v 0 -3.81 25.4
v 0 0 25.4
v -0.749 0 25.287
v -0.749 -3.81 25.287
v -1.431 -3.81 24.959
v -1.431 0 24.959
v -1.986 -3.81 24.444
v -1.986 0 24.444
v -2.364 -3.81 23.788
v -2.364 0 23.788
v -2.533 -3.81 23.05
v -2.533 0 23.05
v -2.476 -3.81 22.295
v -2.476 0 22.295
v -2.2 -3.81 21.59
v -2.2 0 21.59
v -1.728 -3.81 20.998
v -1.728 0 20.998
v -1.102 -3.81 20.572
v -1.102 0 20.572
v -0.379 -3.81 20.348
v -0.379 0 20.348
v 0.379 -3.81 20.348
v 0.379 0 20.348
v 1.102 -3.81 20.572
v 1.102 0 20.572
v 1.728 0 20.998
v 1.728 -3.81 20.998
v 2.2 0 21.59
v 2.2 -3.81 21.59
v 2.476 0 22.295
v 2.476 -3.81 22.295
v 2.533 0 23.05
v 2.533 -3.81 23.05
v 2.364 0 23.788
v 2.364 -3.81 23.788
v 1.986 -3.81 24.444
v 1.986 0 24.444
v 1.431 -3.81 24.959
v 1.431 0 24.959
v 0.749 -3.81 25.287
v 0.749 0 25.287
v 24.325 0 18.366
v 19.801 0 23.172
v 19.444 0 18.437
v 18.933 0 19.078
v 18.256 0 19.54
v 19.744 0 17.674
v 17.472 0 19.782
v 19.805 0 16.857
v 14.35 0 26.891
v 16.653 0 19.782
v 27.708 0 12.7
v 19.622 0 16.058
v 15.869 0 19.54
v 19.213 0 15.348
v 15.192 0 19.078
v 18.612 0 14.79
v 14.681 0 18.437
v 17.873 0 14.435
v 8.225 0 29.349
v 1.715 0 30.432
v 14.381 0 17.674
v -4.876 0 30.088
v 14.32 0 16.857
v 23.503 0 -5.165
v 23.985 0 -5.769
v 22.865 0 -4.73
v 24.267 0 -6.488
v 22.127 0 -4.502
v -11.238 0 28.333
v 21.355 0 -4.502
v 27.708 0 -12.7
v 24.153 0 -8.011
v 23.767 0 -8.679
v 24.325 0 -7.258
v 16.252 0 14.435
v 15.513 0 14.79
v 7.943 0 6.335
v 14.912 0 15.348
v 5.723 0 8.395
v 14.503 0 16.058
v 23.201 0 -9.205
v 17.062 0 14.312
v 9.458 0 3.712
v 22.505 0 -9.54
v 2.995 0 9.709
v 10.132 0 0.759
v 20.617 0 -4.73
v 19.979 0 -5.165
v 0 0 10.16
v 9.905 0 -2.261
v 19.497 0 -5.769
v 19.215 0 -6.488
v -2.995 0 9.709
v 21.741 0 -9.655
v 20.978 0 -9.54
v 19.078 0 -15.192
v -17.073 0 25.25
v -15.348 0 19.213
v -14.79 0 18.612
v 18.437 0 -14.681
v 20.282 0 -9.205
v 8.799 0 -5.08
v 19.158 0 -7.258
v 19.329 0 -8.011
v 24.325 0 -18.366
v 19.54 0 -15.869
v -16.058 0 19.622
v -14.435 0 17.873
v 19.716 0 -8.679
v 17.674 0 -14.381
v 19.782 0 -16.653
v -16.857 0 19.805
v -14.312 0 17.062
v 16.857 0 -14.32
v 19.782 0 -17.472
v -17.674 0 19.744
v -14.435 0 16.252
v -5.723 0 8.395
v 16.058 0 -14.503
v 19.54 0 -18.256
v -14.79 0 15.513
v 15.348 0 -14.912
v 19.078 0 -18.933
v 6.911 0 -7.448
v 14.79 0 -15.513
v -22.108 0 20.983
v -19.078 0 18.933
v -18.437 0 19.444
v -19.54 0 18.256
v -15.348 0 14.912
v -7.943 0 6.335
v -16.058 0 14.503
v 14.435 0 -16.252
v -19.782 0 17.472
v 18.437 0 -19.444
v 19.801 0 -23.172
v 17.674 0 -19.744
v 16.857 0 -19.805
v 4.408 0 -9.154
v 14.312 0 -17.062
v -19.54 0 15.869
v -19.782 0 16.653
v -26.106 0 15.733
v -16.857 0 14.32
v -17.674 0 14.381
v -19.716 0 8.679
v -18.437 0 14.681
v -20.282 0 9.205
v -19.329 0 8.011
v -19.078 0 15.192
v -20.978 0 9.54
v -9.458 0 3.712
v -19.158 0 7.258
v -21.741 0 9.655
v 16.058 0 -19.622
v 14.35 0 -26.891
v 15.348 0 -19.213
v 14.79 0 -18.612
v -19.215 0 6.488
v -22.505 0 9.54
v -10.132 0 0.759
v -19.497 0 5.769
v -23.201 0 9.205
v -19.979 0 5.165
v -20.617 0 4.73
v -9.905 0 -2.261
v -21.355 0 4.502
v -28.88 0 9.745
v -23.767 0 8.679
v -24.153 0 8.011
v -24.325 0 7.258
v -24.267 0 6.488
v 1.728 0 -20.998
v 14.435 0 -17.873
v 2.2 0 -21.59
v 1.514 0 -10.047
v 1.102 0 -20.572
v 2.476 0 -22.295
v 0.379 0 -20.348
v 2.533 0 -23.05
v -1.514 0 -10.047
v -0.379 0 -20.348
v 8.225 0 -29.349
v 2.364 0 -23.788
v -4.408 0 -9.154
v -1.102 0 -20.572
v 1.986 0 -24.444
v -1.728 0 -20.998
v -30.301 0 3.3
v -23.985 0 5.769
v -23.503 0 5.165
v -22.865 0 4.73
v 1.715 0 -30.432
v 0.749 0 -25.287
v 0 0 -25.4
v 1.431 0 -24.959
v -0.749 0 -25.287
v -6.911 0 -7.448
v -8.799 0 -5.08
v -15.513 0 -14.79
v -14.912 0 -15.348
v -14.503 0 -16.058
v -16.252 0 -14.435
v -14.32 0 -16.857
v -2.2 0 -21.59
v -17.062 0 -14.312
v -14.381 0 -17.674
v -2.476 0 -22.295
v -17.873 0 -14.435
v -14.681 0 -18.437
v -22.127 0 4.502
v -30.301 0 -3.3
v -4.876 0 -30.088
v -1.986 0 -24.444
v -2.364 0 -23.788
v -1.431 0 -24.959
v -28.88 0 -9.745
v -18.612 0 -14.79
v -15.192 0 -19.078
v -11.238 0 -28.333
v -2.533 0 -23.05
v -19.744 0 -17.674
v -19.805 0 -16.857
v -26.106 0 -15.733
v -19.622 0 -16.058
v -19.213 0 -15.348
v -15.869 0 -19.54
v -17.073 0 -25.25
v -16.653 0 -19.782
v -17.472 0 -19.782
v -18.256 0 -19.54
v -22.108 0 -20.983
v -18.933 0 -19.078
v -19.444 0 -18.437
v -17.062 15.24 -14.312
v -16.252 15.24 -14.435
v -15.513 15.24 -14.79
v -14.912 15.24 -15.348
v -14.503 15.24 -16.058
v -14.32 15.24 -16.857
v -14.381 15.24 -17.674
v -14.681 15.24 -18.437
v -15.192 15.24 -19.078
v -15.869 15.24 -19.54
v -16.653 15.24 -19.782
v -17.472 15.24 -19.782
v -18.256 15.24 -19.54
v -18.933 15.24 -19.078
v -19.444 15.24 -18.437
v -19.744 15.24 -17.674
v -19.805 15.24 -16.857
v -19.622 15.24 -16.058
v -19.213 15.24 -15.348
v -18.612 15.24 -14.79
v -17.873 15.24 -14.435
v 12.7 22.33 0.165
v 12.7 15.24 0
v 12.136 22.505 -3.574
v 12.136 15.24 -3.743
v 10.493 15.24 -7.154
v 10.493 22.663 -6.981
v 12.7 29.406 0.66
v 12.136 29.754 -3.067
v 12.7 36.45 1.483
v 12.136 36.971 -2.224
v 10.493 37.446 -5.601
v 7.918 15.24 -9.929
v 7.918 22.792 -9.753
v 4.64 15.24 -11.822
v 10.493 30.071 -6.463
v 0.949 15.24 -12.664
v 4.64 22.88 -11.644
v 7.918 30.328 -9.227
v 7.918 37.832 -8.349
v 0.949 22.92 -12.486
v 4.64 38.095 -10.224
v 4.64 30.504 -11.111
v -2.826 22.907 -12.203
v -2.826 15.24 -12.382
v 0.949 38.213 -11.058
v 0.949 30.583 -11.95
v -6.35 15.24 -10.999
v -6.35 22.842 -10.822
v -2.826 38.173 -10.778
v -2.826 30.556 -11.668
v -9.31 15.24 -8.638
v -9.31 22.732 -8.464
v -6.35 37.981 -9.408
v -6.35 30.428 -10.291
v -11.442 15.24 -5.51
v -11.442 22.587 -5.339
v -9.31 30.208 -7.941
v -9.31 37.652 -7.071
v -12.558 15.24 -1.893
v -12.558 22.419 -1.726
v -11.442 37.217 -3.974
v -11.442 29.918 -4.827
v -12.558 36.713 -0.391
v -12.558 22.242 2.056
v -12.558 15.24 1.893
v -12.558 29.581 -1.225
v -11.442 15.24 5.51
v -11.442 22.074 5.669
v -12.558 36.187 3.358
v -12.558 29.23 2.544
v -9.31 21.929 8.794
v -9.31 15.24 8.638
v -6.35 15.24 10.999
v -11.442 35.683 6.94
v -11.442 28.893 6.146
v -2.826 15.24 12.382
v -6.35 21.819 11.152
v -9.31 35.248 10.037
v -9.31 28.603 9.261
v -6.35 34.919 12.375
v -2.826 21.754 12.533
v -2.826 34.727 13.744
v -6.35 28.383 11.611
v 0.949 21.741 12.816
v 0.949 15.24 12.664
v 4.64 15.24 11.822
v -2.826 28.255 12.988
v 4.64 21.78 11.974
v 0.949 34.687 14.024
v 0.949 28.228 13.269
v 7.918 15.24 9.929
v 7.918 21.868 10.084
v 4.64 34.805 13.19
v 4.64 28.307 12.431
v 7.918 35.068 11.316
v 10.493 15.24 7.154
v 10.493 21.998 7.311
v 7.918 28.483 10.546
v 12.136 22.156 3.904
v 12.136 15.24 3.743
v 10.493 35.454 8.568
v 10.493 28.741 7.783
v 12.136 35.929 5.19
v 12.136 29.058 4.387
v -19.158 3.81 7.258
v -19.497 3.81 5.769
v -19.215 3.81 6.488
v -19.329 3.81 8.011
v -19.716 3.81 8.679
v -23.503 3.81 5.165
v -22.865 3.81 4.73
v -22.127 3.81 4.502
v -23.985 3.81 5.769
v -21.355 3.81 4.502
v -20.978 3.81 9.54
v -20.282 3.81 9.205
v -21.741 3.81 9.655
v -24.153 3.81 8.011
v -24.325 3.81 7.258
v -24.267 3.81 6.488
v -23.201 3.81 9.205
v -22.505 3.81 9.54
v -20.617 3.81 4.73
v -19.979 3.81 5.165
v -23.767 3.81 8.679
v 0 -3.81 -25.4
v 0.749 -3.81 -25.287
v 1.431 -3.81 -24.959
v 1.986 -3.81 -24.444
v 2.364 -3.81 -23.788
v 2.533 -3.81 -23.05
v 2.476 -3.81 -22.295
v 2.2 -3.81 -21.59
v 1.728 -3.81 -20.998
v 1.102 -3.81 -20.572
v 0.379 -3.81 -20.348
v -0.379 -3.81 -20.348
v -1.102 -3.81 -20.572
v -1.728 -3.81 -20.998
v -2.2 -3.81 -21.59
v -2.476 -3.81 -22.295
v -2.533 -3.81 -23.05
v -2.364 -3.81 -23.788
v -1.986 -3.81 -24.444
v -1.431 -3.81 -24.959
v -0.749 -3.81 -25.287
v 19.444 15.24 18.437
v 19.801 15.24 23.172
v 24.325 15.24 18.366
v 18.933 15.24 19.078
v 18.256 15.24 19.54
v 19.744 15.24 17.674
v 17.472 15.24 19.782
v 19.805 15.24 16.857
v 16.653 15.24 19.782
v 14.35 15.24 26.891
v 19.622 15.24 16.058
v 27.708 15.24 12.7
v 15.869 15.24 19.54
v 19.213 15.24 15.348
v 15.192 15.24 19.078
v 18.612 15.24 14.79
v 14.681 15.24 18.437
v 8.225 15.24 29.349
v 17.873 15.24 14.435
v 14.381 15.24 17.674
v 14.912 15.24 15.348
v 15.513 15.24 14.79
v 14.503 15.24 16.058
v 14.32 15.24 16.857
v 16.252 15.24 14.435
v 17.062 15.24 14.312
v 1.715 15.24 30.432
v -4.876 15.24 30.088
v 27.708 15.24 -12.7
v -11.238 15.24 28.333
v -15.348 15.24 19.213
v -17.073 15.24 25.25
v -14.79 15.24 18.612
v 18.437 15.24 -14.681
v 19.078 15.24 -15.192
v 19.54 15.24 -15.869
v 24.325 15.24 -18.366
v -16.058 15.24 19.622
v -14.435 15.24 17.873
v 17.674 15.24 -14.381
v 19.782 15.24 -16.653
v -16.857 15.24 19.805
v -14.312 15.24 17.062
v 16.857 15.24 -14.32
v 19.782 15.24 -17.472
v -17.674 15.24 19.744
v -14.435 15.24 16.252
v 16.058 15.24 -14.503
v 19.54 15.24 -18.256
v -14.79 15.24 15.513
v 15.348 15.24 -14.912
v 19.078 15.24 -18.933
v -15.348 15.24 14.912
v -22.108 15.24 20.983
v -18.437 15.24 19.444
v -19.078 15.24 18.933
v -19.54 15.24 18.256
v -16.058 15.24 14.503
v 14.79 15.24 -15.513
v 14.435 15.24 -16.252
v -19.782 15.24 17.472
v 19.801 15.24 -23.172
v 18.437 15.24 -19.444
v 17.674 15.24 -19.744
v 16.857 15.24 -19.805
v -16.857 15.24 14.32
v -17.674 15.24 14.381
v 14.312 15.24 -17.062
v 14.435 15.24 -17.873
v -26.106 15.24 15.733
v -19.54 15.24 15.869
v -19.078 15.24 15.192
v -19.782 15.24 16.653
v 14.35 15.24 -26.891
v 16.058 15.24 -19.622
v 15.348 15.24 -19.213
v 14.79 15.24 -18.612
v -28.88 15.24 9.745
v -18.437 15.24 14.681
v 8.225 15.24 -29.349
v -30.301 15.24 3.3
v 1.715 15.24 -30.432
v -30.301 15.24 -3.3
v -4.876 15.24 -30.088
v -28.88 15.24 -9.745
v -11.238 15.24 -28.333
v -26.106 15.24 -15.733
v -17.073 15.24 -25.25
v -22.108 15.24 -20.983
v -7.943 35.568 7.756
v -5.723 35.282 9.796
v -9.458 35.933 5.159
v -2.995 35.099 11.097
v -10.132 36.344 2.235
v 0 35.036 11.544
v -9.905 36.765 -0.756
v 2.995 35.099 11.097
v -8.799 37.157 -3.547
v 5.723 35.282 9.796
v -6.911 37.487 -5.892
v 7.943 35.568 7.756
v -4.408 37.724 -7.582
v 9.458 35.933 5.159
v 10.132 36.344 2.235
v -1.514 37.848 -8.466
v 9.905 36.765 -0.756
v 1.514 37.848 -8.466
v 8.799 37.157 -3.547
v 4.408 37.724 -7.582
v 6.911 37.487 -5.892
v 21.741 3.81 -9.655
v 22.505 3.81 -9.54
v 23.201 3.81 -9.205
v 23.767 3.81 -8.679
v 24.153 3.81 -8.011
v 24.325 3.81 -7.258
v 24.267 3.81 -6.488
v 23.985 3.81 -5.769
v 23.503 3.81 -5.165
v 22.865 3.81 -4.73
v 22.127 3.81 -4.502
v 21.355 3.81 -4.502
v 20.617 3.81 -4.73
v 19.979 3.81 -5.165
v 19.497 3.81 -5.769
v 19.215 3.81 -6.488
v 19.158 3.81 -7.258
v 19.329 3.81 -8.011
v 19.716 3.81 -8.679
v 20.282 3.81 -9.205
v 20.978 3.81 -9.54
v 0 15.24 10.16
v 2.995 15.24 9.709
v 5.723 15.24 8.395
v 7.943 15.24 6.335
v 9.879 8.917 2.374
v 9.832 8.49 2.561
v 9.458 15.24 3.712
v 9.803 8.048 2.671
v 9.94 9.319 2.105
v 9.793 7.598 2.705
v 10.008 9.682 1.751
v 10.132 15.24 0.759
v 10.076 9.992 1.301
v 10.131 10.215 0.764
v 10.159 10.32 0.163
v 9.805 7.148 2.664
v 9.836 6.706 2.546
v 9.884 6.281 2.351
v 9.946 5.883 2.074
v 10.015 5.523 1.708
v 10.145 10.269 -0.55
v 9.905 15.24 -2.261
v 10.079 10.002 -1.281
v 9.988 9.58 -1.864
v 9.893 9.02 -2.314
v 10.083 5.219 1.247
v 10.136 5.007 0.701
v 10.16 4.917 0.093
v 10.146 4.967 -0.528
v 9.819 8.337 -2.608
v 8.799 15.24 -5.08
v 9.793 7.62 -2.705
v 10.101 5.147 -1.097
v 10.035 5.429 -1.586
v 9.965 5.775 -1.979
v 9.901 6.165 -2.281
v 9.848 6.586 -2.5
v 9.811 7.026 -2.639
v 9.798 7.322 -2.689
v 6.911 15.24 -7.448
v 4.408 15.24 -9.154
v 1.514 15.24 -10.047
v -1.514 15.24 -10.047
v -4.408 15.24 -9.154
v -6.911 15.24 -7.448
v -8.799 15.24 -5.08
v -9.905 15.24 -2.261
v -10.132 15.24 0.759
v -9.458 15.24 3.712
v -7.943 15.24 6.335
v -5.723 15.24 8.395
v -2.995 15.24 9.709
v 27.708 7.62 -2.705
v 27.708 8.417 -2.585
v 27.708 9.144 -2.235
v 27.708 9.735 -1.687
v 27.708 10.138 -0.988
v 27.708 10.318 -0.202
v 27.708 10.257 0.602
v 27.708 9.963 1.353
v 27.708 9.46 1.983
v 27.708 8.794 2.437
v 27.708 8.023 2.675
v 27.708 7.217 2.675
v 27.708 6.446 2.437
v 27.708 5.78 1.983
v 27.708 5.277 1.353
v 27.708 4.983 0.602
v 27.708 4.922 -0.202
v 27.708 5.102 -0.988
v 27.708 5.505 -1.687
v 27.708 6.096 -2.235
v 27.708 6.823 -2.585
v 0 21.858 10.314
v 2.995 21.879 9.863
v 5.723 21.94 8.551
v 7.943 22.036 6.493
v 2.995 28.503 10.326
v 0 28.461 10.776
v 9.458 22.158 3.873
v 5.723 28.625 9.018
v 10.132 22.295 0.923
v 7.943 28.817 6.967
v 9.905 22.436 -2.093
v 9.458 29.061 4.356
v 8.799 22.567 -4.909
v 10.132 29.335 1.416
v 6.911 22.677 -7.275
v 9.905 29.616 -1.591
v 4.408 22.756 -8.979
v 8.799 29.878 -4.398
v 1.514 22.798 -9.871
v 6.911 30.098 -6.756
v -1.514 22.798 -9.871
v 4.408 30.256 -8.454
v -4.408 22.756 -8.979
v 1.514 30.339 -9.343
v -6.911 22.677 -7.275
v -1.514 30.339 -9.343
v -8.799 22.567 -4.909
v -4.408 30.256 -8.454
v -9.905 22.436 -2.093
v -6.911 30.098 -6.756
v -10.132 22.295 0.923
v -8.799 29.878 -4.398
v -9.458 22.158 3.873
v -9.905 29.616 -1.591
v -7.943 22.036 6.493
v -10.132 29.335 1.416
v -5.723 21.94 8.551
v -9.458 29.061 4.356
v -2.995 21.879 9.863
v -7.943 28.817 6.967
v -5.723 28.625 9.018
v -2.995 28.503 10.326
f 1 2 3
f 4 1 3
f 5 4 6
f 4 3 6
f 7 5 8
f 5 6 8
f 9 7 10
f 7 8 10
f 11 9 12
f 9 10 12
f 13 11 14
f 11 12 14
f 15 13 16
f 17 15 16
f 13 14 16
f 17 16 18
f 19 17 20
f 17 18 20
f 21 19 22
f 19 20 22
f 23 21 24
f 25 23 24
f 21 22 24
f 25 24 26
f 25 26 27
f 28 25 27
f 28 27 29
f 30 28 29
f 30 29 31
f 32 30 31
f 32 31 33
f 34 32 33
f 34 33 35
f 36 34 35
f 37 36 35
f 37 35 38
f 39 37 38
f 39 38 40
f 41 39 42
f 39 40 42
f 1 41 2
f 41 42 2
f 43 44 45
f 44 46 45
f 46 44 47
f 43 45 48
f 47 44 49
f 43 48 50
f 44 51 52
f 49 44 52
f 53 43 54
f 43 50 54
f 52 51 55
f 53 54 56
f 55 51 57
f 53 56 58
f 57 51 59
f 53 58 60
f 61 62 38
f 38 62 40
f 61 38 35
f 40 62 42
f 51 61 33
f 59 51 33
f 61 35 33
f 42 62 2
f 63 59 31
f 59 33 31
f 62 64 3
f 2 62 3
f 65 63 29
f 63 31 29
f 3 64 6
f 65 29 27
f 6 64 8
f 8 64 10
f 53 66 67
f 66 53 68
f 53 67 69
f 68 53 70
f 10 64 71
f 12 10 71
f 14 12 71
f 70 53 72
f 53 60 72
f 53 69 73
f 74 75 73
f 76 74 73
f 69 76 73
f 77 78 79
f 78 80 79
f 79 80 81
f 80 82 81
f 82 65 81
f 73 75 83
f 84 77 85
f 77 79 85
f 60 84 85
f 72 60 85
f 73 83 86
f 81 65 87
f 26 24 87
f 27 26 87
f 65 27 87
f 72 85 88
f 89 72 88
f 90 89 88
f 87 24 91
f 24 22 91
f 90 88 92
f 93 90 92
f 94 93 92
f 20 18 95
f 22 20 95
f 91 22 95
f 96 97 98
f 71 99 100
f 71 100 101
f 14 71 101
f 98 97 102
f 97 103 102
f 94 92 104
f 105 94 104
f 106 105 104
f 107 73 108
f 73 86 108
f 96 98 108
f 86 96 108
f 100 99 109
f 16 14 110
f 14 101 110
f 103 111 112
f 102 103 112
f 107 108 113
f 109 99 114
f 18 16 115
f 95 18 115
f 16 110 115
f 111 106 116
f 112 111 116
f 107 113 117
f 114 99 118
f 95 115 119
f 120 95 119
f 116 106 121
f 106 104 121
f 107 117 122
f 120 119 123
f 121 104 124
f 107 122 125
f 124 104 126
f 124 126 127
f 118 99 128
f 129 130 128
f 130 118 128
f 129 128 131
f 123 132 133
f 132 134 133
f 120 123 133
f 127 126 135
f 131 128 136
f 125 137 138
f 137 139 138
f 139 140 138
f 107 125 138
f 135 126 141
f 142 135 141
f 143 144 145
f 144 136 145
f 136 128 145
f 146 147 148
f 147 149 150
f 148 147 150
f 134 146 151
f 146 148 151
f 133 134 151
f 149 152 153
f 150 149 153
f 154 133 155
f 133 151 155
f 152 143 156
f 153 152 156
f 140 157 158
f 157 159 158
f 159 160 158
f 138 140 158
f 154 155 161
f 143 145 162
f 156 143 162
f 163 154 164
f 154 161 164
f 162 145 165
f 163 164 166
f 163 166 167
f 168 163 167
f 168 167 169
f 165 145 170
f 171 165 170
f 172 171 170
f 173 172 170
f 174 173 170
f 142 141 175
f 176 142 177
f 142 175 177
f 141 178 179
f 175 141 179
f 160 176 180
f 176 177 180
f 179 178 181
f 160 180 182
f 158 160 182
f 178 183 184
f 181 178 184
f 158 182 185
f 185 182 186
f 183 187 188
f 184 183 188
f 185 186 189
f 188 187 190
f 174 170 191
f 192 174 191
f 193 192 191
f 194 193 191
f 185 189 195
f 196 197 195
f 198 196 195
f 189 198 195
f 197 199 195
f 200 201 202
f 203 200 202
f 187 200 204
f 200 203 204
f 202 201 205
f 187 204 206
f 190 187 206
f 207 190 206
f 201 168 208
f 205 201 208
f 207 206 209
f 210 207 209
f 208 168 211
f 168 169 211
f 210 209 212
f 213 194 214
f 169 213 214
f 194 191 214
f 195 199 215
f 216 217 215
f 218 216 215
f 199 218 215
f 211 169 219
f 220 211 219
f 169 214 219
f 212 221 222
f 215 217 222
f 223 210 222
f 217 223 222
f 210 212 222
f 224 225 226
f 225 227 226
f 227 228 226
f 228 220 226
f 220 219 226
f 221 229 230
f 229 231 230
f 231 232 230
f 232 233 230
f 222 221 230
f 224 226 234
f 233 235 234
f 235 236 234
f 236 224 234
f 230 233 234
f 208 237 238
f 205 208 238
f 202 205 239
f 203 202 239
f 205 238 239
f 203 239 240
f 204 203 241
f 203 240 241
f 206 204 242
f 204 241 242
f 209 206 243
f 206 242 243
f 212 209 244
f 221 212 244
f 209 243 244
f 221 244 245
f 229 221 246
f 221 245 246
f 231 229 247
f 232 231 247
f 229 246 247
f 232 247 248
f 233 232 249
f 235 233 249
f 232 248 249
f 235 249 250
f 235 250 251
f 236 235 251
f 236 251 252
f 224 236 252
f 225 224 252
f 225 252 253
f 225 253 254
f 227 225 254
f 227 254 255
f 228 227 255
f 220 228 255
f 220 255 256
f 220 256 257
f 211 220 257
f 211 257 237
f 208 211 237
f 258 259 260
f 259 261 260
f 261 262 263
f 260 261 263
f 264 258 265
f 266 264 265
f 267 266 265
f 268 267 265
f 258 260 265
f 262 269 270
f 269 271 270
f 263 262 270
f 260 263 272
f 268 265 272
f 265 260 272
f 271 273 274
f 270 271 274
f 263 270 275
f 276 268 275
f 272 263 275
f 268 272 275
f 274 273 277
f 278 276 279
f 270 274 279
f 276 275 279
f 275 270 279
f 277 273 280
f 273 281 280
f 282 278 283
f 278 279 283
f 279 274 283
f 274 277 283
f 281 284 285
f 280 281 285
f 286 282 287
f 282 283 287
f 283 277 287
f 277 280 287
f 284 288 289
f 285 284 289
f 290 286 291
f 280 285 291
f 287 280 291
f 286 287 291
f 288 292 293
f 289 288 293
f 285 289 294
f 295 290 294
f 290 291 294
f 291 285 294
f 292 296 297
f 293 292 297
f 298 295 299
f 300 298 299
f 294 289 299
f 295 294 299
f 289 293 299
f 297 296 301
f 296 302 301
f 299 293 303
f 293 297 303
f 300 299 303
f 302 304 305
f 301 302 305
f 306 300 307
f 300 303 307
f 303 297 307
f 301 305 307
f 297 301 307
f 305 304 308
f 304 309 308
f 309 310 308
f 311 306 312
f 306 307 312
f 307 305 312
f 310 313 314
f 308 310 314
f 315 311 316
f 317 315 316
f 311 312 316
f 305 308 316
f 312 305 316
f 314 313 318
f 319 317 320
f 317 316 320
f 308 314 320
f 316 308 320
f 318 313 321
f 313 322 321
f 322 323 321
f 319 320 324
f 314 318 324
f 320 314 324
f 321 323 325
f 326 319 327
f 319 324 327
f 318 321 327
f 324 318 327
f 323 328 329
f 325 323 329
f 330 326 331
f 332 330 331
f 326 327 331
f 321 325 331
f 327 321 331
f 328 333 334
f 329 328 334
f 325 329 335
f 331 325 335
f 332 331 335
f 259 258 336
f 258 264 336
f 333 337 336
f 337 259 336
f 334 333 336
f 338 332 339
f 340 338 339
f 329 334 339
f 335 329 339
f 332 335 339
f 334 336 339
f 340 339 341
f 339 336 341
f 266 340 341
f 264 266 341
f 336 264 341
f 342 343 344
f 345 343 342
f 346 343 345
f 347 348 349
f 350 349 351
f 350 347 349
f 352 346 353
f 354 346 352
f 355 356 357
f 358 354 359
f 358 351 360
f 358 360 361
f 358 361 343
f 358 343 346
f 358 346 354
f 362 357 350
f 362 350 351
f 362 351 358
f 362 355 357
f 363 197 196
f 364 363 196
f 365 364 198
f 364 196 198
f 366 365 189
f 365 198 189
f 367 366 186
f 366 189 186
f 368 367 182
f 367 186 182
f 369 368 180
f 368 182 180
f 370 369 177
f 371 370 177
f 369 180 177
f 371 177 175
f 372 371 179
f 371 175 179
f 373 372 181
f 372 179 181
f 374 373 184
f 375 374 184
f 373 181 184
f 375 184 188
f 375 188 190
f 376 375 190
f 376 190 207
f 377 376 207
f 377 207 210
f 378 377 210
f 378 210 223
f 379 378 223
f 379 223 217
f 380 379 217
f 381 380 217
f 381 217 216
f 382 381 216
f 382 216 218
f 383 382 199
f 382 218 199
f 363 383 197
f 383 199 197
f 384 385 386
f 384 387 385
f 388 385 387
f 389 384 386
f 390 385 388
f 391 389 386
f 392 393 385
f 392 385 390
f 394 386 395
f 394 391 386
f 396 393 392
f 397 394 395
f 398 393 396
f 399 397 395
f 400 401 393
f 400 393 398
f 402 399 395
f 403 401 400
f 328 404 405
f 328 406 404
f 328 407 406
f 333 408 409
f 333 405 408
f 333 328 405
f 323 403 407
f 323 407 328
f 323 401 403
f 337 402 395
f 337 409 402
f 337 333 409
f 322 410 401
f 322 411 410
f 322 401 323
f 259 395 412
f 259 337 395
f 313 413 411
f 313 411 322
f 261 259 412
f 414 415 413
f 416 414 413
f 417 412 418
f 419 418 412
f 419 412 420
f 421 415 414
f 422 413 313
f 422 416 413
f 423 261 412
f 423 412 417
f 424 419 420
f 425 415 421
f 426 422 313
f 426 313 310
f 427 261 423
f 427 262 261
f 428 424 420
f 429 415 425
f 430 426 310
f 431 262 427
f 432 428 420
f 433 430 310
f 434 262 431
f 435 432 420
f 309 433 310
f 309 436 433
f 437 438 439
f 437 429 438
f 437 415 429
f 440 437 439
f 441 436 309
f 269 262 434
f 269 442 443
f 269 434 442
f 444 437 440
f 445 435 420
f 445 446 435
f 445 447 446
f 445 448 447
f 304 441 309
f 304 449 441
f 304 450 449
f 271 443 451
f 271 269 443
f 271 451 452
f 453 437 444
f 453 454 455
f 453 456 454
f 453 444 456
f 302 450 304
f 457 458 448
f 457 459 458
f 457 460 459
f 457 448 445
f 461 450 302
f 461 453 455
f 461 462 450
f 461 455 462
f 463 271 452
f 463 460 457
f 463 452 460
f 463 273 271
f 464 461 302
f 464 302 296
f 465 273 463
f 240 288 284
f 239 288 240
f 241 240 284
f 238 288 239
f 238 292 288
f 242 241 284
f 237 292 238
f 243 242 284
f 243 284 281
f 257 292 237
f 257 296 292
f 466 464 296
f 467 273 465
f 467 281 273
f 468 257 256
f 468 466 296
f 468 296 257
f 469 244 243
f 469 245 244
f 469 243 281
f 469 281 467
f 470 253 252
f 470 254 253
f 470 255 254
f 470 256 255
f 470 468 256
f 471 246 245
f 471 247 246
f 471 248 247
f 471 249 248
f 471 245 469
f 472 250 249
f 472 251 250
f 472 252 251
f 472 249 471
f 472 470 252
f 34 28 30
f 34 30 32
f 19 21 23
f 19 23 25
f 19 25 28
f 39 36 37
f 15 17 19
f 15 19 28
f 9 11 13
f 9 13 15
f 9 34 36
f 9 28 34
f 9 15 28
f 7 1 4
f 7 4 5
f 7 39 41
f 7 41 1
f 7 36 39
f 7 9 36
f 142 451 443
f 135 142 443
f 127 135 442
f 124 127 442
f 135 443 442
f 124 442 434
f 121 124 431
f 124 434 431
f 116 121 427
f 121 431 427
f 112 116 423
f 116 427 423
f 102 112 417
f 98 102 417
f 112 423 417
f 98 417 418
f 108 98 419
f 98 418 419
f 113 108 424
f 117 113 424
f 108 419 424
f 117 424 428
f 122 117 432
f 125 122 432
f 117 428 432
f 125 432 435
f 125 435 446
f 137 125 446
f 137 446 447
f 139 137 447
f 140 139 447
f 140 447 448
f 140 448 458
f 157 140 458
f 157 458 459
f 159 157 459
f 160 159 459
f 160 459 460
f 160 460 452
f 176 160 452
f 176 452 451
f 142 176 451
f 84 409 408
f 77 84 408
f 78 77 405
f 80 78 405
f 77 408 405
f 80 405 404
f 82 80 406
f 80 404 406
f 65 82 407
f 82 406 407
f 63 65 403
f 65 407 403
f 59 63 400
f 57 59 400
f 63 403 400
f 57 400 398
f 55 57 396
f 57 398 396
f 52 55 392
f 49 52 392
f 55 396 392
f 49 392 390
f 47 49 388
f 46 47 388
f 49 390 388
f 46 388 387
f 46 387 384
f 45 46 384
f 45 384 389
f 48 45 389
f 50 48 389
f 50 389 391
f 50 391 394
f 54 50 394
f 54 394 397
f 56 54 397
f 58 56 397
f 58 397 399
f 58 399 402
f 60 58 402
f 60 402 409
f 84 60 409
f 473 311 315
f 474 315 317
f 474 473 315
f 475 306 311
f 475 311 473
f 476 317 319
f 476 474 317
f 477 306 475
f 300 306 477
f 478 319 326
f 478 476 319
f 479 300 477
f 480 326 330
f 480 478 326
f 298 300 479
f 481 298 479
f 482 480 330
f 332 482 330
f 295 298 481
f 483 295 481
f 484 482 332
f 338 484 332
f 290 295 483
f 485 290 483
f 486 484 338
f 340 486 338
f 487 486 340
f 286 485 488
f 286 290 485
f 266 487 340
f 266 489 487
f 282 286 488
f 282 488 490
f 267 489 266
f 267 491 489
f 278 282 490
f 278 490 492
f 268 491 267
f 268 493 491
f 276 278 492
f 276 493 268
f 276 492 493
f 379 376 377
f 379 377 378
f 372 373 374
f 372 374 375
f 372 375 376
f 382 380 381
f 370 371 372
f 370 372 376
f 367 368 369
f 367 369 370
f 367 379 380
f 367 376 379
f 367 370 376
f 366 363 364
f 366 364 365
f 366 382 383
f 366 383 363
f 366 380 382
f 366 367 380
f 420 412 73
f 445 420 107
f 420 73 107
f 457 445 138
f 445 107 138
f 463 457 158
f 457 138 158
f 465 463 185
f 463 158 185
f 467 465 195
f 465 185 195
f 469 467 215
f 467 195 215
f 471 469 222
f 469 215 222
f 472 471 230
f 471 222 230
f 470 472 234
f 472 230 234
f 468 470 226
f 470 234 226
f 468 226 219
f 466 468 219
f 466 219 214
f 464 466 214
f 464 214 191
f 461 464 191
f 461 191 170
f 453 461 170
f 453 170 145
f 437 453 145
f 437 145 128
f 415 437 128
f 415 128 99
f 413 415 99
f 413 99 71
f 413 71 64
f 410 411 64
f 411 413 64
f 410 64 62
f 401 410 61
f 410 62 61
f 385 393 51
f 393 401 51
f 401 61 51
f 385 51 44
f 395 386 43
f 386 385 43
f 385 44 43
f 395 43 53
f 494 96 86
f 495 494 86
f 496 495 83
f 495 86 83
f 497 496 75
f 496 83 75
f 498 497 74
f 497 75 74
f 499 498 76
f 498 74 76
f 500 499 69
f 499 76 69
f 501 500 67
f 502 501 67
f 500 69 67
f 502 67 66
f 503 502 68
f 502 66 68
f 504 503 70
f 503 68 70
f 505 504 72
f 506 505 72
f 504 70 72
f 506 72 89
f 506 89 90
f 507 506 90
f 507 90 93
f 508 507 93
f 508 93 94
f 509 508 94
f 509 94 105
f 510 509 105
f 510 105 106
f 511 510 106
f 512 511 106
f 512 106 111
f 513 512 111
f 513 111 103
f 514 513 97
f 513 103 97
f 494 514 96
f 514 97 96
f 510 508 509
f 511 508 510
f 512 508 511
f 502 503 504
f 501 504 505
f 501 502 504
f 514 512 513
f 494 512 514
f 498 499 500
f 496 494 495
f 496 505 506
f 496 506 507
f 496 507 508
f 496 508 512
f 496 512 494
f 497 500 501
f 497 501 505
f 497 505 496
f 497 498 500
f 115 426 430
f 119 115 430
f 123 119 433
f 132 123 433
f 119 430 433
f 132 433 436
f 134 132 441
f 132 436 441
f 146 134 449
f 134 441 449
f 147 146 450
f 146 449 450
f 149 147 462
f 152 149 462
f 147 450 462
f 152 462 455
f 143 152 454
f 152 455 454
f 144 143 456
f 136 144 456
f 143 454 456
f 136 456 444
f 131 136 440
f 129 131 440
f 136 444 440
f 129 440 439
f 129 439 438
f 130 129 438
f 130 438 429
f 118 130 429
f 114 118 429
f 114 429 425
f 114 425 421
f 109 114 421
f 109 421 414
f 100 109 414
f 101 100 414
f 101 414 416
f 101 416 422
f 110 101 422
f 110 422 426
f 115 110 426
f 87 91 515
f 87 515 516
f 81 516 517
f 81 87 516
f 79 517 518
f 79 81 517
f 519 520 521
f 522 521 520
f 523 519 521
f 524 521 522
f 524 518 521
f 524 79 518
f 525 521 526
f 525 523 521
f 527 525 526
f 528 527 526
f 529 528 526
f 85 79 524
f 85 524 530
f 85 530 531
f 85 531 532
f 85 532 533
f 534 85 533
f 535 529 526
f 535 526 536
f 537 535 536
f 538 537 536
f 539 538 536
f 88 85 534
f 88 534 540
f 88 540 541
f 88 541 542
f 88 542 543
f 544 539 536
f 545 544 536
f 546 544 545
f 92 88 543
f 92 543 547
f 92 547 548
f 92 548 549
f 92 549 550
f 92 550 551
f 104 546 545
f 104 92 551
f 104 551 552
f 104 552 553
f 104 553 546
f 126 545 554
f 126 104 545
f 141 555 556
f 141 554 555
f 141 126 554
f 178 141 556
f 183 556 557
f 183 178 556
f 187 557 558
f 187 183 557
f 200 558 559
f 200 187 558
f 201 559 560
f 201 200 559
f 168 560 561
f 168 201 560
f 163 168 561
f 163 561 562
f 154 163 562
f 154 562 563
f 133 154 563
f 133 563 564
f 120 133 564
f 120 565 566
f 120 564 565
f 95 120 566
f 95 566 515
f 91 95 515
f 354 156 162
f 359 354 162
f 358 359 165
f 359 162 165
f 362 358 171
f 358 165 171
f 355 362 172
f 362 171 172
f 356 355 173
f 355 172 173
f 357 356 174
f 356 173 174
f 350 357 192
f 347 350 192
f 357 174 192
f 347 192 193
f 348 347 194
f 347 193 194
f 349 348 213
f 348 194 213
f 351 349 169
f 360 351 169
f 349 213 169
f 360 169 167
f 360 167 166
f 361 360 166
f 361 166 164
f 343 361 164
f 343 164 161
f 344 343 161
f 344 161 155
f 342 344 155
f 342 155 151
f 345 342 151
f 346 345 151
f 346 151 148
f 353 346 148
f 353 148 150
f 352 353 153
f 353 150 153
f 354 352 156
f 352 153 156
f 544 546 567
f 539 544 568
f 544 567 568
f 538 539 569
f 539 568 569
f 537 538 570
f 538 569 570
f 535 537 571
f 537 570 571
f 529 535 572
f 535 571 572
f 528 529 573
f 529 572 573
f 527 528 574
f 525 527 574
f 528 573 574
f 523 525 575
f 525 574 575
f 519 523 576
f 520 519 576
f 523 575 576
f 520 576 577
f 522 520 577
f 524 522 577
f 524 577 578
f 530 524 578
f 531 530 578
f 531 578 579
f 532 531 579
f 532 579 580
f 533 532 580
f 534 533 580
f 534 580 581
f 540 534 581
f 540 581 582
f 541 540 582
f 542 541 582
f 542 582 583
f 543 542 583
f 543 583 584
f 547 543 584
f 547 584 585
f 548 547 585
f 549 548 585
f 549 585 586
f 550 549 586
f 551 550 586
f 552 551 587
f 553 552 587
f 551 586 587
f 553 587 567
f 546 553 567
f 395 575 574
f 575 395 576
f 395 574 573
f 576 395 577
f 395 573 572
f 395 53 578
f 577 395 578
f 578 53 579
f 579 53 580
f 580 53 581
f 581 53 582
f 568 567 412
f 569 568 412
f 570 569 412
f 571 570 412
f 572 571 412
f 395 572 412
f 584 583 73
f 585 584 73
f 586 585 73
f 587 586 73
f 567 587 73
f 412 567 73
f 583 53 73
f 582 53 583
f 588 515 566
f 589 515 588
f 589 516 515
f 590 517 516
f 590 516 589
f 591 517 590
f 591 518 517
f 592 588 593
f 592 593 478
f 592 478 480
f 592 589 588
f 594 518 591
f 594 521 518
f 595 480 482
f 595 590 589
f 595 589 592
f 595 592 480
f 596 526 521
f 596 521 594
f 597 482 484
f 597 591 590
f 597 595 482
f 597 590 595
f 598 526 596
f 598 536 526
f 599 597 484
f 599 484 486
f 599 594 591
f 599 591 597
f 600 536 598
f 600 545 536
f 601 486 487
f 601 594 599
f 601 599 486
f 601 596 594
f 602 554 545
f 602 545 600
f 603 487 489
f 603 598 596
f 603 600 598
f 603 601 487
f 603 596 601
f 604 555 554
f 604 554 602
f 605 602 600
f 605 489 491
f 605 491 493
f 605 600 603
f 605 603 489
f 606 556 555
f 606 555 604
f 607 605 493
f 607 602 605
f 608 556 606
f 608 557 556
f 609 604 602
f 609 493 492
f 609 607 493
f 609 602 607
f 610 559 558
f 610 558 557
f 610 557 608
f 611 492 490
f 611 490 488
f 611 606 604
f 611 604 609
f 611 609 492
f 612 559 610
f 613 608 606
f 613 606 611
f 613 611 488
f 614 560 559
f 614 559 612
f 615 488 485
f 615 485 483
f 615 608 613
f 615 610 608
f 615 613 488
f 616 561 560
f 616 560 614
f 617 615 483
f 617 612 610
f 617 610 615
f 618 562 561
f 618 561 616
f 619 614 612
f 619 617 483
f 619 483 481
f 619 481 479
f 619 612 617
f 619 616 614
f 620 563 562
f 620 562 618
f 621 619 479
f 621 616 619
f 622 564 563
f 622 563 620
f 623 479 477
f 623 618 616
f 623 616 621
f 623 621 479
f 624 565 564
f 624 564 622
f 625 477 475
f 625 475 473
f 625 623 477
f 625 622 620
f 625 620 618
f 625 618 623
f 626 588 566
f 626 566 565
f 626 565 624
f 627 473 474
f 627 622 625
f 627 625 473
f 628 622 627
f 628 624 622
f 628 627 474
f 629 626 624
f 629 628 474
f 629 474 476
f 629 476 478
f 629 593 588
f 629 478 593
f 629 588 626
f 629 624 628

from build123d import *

# Parameters (mm, degrees)
SKETCH1_R                         = 30.48
MAIN_BODY_EXTRUDE_DEPTH           = 15.24
THROUGH_HOLE_FOR_BLOOD_DEPTH      = 46.72
THROUGH_HOLE_FOR_BLOOD_DEPTH_BACK = 46.72
SKETCH2_R                         = 10.16
M5_CLEARANCE_HOLE_D               = 5.5
SCREW_HOLE_PATTERN_COUNT          = 4
CUT_EXTRUDE2_DEPTH                = 46.72
SKETCH18_7_R                      = 2.5908
FLAT_SIDE_DOWEL_HOLE_DEPTH        = 3.81
SKETCH27_4_R                      = 2.54
FLAT_SIDE_DOWEL_DEPTH             = 3.81
CIRPATTERN1_COUNT                 = 2
CIRPATTERN2_COUNT                 = 2
SKETCH52_R                        = 12.7
SKETCH52_R_2                      = 10.16
REVOLVE2_ANGLE                    = 8
F_1_4_28_TAPPED_HOLE1_REACH       = 77.996
F_1_4_28_TAPPED_HOLE1_BORE_R      = 2.7051


with BuildPart() as part:
    # Sketch1 → Main Body Extrude (new body)
    with BuildSketch(Plane(origin=(0, 0, 0), x_dir=(1, 0, 0), z_dir=(0, 1, 0))):
        with Locations(Location((0, 0, 0), (0, 0, 90))):
            Circle(SKETCH1_R)
    extrude(amount=MAIN_BODY_EXTRUDE_DEPTH)

    # Sketch2 → Through Hole For Blood (cut, two sides: drawn at the far end of the back side and taken through both)
    with BuildSketch(Plane(origin=(0, 15.24, 0), x_dir=(1, 0, 0), z_dir=(0, 1, 0)).offset(-THROUGH_HOLE_FOR_BLOOD_DEPTH_BACK)):
        with Locations(Location((0, 0, 0), (0, 0, 270))):
            Circle(SKETCH2_R)
    extrude(amount=THROUGH_HOLE_FOR_BLOOD_DEPTH + THROUGH_HOLE_FOR_BLOOD_DEPTH_BACK, mode=Mode.SUBTRACT)

    # M5 Clearance Hole (through all)
    with Locations(Plane(origin=(0, 0, 0), x_dir=(-1, 0, 0), z_dir=(0, -1, 0))):
        with Locations((17.06248663, -17.06248663)):
            m5_clearance_hole = Hole(M5_CLEARANCE_HOLE_D / 2)

    # Screw Hole Pattern: M5 Clearance Hole ×4 about axis
    screw_hole_pattern_axis = Axis((0, 0, 0), (0, 1, 0))
    for i in range(1, SCREW_HOLE_PATTERN_COUNT):
        add(m5_clearance_hole.rotate(screw_hole_pattern_axis, i * 360 / SCREW_HOLE_PATTERN_COUNT), mode=Mode.SUBTRACT)

    # Sketch42 → Cut-Extrude2 (cut, through all)
    with BuildSketch(Plane.XZ):
        with BuildLine():
            Line((27.708128771, 12.7), (27.708128771, -12.7))
            ThreePointArc((27.708128771, -12.7), (30.48, 0), (27.708128771, 12.7))
        make_face()
    extrude(amount=-CUT_EXTRUDE2_DEPTH, mode=Mode.SUBTRACT)

    # Sketch18<7> → Flat Side Dowel Hole (cut)
    with BuildSketch(Plane(origin=(0, 0, 0), x_dir=(-1, 0, 0), z_dir=(0, -1, 0))):
        with Locations(Location((-21.741151963, 7.064128491, 0), (0, 0, 90))):
            Circle(SKETCH18_7_R)
    flat_side_dowel_hole = extrude(amount=-FLAT_SIDE_DOWEL_HOLE_DEPTH, mode=Mode.SUBTRACT)

    # Sketch27<4> → Flat Side Dowel (add)
    with BuildSketch(Plane.XZ):
        with Locations(Location((0, 22.86, 0), (0, 0, 90))):
            Circle(SKETCH27_4_R)
    flat_side_dowel = extrude(amount=FLAT_SIDE_DOWEL_DEPTH)

    # CirPattern1: Flat Side Dowel Hole ×2 about axis
    cirpattern1_axis = Axis((0, 0, 0), (0, 1, 0))
    for i in range(1, CIRPATTERN1_COUNT):
        add(flat_side_dowel_hole.rotate(cirpattern1_axis, i * 360 / CIRPATTERN1_COUNT), mode=Mode.SUBTRACT)

    # CirPattern2: Flat Side Dowel ×2 about axis
    cirpattern2_axis = Axis((0, 0, 0), (0, 1, 0))
    for i in range(1, CIRPATTERN2_COUNT):
        add(flat_side_dowel.rotate(cirpattern2_axis, i * 360 / CIRPATTERN2_COUNT))

    # Sketch52 → Revolve2 (revolve)
    with BuildSketch(Plane(origin=(0, 15.24, 0), x_dir=(1, 0, 0), z_dir=(0, 1, 0))):
        Circle(SKETCH52_R)
        with Locations(Location((0, 0, 0), (0, 0, 270))):
            Circle(SKETCH52_R_2, mode=Mode.SUBTRACT)
    revolve(axis=Axis((0, 15.24, 152.4), (1, 0, 0)), revolution_arc=REVOLVE2_ANGLE)

    # 1/4-28 Tapped Hole1 bore → 1/4-28 Tapped Hole1 (cut, up to next)
    with BuildSketch(Plane(origin=(27.708128771, 0, 0), x_dir=(0, 0, -1), z_dir=(1, 0, 0)), mode=Mode.PRIVATE) as f_1_4_28_tapped_hole1_sk1:
        with Locations((0, 7.62)):
            Circle(F_1_4_28_TAPPED_HOLE1_BORE_R)
    f_1_4_28_tapped_hole1_tool1 = extrude(f_1_4_28_tapped_hole1_sk1.sketch, amount=-F_1_4_28_TAPPED_HOLE1_REACH, mode=Mode.PRIVATE) & part.part
    add(f_1_4_28_tapped_hole1_tool1.solids().sort_by_distance((27.708129, 7.62, 0))[0], mode=Mode.SUBTRACT)


solid = part.part
